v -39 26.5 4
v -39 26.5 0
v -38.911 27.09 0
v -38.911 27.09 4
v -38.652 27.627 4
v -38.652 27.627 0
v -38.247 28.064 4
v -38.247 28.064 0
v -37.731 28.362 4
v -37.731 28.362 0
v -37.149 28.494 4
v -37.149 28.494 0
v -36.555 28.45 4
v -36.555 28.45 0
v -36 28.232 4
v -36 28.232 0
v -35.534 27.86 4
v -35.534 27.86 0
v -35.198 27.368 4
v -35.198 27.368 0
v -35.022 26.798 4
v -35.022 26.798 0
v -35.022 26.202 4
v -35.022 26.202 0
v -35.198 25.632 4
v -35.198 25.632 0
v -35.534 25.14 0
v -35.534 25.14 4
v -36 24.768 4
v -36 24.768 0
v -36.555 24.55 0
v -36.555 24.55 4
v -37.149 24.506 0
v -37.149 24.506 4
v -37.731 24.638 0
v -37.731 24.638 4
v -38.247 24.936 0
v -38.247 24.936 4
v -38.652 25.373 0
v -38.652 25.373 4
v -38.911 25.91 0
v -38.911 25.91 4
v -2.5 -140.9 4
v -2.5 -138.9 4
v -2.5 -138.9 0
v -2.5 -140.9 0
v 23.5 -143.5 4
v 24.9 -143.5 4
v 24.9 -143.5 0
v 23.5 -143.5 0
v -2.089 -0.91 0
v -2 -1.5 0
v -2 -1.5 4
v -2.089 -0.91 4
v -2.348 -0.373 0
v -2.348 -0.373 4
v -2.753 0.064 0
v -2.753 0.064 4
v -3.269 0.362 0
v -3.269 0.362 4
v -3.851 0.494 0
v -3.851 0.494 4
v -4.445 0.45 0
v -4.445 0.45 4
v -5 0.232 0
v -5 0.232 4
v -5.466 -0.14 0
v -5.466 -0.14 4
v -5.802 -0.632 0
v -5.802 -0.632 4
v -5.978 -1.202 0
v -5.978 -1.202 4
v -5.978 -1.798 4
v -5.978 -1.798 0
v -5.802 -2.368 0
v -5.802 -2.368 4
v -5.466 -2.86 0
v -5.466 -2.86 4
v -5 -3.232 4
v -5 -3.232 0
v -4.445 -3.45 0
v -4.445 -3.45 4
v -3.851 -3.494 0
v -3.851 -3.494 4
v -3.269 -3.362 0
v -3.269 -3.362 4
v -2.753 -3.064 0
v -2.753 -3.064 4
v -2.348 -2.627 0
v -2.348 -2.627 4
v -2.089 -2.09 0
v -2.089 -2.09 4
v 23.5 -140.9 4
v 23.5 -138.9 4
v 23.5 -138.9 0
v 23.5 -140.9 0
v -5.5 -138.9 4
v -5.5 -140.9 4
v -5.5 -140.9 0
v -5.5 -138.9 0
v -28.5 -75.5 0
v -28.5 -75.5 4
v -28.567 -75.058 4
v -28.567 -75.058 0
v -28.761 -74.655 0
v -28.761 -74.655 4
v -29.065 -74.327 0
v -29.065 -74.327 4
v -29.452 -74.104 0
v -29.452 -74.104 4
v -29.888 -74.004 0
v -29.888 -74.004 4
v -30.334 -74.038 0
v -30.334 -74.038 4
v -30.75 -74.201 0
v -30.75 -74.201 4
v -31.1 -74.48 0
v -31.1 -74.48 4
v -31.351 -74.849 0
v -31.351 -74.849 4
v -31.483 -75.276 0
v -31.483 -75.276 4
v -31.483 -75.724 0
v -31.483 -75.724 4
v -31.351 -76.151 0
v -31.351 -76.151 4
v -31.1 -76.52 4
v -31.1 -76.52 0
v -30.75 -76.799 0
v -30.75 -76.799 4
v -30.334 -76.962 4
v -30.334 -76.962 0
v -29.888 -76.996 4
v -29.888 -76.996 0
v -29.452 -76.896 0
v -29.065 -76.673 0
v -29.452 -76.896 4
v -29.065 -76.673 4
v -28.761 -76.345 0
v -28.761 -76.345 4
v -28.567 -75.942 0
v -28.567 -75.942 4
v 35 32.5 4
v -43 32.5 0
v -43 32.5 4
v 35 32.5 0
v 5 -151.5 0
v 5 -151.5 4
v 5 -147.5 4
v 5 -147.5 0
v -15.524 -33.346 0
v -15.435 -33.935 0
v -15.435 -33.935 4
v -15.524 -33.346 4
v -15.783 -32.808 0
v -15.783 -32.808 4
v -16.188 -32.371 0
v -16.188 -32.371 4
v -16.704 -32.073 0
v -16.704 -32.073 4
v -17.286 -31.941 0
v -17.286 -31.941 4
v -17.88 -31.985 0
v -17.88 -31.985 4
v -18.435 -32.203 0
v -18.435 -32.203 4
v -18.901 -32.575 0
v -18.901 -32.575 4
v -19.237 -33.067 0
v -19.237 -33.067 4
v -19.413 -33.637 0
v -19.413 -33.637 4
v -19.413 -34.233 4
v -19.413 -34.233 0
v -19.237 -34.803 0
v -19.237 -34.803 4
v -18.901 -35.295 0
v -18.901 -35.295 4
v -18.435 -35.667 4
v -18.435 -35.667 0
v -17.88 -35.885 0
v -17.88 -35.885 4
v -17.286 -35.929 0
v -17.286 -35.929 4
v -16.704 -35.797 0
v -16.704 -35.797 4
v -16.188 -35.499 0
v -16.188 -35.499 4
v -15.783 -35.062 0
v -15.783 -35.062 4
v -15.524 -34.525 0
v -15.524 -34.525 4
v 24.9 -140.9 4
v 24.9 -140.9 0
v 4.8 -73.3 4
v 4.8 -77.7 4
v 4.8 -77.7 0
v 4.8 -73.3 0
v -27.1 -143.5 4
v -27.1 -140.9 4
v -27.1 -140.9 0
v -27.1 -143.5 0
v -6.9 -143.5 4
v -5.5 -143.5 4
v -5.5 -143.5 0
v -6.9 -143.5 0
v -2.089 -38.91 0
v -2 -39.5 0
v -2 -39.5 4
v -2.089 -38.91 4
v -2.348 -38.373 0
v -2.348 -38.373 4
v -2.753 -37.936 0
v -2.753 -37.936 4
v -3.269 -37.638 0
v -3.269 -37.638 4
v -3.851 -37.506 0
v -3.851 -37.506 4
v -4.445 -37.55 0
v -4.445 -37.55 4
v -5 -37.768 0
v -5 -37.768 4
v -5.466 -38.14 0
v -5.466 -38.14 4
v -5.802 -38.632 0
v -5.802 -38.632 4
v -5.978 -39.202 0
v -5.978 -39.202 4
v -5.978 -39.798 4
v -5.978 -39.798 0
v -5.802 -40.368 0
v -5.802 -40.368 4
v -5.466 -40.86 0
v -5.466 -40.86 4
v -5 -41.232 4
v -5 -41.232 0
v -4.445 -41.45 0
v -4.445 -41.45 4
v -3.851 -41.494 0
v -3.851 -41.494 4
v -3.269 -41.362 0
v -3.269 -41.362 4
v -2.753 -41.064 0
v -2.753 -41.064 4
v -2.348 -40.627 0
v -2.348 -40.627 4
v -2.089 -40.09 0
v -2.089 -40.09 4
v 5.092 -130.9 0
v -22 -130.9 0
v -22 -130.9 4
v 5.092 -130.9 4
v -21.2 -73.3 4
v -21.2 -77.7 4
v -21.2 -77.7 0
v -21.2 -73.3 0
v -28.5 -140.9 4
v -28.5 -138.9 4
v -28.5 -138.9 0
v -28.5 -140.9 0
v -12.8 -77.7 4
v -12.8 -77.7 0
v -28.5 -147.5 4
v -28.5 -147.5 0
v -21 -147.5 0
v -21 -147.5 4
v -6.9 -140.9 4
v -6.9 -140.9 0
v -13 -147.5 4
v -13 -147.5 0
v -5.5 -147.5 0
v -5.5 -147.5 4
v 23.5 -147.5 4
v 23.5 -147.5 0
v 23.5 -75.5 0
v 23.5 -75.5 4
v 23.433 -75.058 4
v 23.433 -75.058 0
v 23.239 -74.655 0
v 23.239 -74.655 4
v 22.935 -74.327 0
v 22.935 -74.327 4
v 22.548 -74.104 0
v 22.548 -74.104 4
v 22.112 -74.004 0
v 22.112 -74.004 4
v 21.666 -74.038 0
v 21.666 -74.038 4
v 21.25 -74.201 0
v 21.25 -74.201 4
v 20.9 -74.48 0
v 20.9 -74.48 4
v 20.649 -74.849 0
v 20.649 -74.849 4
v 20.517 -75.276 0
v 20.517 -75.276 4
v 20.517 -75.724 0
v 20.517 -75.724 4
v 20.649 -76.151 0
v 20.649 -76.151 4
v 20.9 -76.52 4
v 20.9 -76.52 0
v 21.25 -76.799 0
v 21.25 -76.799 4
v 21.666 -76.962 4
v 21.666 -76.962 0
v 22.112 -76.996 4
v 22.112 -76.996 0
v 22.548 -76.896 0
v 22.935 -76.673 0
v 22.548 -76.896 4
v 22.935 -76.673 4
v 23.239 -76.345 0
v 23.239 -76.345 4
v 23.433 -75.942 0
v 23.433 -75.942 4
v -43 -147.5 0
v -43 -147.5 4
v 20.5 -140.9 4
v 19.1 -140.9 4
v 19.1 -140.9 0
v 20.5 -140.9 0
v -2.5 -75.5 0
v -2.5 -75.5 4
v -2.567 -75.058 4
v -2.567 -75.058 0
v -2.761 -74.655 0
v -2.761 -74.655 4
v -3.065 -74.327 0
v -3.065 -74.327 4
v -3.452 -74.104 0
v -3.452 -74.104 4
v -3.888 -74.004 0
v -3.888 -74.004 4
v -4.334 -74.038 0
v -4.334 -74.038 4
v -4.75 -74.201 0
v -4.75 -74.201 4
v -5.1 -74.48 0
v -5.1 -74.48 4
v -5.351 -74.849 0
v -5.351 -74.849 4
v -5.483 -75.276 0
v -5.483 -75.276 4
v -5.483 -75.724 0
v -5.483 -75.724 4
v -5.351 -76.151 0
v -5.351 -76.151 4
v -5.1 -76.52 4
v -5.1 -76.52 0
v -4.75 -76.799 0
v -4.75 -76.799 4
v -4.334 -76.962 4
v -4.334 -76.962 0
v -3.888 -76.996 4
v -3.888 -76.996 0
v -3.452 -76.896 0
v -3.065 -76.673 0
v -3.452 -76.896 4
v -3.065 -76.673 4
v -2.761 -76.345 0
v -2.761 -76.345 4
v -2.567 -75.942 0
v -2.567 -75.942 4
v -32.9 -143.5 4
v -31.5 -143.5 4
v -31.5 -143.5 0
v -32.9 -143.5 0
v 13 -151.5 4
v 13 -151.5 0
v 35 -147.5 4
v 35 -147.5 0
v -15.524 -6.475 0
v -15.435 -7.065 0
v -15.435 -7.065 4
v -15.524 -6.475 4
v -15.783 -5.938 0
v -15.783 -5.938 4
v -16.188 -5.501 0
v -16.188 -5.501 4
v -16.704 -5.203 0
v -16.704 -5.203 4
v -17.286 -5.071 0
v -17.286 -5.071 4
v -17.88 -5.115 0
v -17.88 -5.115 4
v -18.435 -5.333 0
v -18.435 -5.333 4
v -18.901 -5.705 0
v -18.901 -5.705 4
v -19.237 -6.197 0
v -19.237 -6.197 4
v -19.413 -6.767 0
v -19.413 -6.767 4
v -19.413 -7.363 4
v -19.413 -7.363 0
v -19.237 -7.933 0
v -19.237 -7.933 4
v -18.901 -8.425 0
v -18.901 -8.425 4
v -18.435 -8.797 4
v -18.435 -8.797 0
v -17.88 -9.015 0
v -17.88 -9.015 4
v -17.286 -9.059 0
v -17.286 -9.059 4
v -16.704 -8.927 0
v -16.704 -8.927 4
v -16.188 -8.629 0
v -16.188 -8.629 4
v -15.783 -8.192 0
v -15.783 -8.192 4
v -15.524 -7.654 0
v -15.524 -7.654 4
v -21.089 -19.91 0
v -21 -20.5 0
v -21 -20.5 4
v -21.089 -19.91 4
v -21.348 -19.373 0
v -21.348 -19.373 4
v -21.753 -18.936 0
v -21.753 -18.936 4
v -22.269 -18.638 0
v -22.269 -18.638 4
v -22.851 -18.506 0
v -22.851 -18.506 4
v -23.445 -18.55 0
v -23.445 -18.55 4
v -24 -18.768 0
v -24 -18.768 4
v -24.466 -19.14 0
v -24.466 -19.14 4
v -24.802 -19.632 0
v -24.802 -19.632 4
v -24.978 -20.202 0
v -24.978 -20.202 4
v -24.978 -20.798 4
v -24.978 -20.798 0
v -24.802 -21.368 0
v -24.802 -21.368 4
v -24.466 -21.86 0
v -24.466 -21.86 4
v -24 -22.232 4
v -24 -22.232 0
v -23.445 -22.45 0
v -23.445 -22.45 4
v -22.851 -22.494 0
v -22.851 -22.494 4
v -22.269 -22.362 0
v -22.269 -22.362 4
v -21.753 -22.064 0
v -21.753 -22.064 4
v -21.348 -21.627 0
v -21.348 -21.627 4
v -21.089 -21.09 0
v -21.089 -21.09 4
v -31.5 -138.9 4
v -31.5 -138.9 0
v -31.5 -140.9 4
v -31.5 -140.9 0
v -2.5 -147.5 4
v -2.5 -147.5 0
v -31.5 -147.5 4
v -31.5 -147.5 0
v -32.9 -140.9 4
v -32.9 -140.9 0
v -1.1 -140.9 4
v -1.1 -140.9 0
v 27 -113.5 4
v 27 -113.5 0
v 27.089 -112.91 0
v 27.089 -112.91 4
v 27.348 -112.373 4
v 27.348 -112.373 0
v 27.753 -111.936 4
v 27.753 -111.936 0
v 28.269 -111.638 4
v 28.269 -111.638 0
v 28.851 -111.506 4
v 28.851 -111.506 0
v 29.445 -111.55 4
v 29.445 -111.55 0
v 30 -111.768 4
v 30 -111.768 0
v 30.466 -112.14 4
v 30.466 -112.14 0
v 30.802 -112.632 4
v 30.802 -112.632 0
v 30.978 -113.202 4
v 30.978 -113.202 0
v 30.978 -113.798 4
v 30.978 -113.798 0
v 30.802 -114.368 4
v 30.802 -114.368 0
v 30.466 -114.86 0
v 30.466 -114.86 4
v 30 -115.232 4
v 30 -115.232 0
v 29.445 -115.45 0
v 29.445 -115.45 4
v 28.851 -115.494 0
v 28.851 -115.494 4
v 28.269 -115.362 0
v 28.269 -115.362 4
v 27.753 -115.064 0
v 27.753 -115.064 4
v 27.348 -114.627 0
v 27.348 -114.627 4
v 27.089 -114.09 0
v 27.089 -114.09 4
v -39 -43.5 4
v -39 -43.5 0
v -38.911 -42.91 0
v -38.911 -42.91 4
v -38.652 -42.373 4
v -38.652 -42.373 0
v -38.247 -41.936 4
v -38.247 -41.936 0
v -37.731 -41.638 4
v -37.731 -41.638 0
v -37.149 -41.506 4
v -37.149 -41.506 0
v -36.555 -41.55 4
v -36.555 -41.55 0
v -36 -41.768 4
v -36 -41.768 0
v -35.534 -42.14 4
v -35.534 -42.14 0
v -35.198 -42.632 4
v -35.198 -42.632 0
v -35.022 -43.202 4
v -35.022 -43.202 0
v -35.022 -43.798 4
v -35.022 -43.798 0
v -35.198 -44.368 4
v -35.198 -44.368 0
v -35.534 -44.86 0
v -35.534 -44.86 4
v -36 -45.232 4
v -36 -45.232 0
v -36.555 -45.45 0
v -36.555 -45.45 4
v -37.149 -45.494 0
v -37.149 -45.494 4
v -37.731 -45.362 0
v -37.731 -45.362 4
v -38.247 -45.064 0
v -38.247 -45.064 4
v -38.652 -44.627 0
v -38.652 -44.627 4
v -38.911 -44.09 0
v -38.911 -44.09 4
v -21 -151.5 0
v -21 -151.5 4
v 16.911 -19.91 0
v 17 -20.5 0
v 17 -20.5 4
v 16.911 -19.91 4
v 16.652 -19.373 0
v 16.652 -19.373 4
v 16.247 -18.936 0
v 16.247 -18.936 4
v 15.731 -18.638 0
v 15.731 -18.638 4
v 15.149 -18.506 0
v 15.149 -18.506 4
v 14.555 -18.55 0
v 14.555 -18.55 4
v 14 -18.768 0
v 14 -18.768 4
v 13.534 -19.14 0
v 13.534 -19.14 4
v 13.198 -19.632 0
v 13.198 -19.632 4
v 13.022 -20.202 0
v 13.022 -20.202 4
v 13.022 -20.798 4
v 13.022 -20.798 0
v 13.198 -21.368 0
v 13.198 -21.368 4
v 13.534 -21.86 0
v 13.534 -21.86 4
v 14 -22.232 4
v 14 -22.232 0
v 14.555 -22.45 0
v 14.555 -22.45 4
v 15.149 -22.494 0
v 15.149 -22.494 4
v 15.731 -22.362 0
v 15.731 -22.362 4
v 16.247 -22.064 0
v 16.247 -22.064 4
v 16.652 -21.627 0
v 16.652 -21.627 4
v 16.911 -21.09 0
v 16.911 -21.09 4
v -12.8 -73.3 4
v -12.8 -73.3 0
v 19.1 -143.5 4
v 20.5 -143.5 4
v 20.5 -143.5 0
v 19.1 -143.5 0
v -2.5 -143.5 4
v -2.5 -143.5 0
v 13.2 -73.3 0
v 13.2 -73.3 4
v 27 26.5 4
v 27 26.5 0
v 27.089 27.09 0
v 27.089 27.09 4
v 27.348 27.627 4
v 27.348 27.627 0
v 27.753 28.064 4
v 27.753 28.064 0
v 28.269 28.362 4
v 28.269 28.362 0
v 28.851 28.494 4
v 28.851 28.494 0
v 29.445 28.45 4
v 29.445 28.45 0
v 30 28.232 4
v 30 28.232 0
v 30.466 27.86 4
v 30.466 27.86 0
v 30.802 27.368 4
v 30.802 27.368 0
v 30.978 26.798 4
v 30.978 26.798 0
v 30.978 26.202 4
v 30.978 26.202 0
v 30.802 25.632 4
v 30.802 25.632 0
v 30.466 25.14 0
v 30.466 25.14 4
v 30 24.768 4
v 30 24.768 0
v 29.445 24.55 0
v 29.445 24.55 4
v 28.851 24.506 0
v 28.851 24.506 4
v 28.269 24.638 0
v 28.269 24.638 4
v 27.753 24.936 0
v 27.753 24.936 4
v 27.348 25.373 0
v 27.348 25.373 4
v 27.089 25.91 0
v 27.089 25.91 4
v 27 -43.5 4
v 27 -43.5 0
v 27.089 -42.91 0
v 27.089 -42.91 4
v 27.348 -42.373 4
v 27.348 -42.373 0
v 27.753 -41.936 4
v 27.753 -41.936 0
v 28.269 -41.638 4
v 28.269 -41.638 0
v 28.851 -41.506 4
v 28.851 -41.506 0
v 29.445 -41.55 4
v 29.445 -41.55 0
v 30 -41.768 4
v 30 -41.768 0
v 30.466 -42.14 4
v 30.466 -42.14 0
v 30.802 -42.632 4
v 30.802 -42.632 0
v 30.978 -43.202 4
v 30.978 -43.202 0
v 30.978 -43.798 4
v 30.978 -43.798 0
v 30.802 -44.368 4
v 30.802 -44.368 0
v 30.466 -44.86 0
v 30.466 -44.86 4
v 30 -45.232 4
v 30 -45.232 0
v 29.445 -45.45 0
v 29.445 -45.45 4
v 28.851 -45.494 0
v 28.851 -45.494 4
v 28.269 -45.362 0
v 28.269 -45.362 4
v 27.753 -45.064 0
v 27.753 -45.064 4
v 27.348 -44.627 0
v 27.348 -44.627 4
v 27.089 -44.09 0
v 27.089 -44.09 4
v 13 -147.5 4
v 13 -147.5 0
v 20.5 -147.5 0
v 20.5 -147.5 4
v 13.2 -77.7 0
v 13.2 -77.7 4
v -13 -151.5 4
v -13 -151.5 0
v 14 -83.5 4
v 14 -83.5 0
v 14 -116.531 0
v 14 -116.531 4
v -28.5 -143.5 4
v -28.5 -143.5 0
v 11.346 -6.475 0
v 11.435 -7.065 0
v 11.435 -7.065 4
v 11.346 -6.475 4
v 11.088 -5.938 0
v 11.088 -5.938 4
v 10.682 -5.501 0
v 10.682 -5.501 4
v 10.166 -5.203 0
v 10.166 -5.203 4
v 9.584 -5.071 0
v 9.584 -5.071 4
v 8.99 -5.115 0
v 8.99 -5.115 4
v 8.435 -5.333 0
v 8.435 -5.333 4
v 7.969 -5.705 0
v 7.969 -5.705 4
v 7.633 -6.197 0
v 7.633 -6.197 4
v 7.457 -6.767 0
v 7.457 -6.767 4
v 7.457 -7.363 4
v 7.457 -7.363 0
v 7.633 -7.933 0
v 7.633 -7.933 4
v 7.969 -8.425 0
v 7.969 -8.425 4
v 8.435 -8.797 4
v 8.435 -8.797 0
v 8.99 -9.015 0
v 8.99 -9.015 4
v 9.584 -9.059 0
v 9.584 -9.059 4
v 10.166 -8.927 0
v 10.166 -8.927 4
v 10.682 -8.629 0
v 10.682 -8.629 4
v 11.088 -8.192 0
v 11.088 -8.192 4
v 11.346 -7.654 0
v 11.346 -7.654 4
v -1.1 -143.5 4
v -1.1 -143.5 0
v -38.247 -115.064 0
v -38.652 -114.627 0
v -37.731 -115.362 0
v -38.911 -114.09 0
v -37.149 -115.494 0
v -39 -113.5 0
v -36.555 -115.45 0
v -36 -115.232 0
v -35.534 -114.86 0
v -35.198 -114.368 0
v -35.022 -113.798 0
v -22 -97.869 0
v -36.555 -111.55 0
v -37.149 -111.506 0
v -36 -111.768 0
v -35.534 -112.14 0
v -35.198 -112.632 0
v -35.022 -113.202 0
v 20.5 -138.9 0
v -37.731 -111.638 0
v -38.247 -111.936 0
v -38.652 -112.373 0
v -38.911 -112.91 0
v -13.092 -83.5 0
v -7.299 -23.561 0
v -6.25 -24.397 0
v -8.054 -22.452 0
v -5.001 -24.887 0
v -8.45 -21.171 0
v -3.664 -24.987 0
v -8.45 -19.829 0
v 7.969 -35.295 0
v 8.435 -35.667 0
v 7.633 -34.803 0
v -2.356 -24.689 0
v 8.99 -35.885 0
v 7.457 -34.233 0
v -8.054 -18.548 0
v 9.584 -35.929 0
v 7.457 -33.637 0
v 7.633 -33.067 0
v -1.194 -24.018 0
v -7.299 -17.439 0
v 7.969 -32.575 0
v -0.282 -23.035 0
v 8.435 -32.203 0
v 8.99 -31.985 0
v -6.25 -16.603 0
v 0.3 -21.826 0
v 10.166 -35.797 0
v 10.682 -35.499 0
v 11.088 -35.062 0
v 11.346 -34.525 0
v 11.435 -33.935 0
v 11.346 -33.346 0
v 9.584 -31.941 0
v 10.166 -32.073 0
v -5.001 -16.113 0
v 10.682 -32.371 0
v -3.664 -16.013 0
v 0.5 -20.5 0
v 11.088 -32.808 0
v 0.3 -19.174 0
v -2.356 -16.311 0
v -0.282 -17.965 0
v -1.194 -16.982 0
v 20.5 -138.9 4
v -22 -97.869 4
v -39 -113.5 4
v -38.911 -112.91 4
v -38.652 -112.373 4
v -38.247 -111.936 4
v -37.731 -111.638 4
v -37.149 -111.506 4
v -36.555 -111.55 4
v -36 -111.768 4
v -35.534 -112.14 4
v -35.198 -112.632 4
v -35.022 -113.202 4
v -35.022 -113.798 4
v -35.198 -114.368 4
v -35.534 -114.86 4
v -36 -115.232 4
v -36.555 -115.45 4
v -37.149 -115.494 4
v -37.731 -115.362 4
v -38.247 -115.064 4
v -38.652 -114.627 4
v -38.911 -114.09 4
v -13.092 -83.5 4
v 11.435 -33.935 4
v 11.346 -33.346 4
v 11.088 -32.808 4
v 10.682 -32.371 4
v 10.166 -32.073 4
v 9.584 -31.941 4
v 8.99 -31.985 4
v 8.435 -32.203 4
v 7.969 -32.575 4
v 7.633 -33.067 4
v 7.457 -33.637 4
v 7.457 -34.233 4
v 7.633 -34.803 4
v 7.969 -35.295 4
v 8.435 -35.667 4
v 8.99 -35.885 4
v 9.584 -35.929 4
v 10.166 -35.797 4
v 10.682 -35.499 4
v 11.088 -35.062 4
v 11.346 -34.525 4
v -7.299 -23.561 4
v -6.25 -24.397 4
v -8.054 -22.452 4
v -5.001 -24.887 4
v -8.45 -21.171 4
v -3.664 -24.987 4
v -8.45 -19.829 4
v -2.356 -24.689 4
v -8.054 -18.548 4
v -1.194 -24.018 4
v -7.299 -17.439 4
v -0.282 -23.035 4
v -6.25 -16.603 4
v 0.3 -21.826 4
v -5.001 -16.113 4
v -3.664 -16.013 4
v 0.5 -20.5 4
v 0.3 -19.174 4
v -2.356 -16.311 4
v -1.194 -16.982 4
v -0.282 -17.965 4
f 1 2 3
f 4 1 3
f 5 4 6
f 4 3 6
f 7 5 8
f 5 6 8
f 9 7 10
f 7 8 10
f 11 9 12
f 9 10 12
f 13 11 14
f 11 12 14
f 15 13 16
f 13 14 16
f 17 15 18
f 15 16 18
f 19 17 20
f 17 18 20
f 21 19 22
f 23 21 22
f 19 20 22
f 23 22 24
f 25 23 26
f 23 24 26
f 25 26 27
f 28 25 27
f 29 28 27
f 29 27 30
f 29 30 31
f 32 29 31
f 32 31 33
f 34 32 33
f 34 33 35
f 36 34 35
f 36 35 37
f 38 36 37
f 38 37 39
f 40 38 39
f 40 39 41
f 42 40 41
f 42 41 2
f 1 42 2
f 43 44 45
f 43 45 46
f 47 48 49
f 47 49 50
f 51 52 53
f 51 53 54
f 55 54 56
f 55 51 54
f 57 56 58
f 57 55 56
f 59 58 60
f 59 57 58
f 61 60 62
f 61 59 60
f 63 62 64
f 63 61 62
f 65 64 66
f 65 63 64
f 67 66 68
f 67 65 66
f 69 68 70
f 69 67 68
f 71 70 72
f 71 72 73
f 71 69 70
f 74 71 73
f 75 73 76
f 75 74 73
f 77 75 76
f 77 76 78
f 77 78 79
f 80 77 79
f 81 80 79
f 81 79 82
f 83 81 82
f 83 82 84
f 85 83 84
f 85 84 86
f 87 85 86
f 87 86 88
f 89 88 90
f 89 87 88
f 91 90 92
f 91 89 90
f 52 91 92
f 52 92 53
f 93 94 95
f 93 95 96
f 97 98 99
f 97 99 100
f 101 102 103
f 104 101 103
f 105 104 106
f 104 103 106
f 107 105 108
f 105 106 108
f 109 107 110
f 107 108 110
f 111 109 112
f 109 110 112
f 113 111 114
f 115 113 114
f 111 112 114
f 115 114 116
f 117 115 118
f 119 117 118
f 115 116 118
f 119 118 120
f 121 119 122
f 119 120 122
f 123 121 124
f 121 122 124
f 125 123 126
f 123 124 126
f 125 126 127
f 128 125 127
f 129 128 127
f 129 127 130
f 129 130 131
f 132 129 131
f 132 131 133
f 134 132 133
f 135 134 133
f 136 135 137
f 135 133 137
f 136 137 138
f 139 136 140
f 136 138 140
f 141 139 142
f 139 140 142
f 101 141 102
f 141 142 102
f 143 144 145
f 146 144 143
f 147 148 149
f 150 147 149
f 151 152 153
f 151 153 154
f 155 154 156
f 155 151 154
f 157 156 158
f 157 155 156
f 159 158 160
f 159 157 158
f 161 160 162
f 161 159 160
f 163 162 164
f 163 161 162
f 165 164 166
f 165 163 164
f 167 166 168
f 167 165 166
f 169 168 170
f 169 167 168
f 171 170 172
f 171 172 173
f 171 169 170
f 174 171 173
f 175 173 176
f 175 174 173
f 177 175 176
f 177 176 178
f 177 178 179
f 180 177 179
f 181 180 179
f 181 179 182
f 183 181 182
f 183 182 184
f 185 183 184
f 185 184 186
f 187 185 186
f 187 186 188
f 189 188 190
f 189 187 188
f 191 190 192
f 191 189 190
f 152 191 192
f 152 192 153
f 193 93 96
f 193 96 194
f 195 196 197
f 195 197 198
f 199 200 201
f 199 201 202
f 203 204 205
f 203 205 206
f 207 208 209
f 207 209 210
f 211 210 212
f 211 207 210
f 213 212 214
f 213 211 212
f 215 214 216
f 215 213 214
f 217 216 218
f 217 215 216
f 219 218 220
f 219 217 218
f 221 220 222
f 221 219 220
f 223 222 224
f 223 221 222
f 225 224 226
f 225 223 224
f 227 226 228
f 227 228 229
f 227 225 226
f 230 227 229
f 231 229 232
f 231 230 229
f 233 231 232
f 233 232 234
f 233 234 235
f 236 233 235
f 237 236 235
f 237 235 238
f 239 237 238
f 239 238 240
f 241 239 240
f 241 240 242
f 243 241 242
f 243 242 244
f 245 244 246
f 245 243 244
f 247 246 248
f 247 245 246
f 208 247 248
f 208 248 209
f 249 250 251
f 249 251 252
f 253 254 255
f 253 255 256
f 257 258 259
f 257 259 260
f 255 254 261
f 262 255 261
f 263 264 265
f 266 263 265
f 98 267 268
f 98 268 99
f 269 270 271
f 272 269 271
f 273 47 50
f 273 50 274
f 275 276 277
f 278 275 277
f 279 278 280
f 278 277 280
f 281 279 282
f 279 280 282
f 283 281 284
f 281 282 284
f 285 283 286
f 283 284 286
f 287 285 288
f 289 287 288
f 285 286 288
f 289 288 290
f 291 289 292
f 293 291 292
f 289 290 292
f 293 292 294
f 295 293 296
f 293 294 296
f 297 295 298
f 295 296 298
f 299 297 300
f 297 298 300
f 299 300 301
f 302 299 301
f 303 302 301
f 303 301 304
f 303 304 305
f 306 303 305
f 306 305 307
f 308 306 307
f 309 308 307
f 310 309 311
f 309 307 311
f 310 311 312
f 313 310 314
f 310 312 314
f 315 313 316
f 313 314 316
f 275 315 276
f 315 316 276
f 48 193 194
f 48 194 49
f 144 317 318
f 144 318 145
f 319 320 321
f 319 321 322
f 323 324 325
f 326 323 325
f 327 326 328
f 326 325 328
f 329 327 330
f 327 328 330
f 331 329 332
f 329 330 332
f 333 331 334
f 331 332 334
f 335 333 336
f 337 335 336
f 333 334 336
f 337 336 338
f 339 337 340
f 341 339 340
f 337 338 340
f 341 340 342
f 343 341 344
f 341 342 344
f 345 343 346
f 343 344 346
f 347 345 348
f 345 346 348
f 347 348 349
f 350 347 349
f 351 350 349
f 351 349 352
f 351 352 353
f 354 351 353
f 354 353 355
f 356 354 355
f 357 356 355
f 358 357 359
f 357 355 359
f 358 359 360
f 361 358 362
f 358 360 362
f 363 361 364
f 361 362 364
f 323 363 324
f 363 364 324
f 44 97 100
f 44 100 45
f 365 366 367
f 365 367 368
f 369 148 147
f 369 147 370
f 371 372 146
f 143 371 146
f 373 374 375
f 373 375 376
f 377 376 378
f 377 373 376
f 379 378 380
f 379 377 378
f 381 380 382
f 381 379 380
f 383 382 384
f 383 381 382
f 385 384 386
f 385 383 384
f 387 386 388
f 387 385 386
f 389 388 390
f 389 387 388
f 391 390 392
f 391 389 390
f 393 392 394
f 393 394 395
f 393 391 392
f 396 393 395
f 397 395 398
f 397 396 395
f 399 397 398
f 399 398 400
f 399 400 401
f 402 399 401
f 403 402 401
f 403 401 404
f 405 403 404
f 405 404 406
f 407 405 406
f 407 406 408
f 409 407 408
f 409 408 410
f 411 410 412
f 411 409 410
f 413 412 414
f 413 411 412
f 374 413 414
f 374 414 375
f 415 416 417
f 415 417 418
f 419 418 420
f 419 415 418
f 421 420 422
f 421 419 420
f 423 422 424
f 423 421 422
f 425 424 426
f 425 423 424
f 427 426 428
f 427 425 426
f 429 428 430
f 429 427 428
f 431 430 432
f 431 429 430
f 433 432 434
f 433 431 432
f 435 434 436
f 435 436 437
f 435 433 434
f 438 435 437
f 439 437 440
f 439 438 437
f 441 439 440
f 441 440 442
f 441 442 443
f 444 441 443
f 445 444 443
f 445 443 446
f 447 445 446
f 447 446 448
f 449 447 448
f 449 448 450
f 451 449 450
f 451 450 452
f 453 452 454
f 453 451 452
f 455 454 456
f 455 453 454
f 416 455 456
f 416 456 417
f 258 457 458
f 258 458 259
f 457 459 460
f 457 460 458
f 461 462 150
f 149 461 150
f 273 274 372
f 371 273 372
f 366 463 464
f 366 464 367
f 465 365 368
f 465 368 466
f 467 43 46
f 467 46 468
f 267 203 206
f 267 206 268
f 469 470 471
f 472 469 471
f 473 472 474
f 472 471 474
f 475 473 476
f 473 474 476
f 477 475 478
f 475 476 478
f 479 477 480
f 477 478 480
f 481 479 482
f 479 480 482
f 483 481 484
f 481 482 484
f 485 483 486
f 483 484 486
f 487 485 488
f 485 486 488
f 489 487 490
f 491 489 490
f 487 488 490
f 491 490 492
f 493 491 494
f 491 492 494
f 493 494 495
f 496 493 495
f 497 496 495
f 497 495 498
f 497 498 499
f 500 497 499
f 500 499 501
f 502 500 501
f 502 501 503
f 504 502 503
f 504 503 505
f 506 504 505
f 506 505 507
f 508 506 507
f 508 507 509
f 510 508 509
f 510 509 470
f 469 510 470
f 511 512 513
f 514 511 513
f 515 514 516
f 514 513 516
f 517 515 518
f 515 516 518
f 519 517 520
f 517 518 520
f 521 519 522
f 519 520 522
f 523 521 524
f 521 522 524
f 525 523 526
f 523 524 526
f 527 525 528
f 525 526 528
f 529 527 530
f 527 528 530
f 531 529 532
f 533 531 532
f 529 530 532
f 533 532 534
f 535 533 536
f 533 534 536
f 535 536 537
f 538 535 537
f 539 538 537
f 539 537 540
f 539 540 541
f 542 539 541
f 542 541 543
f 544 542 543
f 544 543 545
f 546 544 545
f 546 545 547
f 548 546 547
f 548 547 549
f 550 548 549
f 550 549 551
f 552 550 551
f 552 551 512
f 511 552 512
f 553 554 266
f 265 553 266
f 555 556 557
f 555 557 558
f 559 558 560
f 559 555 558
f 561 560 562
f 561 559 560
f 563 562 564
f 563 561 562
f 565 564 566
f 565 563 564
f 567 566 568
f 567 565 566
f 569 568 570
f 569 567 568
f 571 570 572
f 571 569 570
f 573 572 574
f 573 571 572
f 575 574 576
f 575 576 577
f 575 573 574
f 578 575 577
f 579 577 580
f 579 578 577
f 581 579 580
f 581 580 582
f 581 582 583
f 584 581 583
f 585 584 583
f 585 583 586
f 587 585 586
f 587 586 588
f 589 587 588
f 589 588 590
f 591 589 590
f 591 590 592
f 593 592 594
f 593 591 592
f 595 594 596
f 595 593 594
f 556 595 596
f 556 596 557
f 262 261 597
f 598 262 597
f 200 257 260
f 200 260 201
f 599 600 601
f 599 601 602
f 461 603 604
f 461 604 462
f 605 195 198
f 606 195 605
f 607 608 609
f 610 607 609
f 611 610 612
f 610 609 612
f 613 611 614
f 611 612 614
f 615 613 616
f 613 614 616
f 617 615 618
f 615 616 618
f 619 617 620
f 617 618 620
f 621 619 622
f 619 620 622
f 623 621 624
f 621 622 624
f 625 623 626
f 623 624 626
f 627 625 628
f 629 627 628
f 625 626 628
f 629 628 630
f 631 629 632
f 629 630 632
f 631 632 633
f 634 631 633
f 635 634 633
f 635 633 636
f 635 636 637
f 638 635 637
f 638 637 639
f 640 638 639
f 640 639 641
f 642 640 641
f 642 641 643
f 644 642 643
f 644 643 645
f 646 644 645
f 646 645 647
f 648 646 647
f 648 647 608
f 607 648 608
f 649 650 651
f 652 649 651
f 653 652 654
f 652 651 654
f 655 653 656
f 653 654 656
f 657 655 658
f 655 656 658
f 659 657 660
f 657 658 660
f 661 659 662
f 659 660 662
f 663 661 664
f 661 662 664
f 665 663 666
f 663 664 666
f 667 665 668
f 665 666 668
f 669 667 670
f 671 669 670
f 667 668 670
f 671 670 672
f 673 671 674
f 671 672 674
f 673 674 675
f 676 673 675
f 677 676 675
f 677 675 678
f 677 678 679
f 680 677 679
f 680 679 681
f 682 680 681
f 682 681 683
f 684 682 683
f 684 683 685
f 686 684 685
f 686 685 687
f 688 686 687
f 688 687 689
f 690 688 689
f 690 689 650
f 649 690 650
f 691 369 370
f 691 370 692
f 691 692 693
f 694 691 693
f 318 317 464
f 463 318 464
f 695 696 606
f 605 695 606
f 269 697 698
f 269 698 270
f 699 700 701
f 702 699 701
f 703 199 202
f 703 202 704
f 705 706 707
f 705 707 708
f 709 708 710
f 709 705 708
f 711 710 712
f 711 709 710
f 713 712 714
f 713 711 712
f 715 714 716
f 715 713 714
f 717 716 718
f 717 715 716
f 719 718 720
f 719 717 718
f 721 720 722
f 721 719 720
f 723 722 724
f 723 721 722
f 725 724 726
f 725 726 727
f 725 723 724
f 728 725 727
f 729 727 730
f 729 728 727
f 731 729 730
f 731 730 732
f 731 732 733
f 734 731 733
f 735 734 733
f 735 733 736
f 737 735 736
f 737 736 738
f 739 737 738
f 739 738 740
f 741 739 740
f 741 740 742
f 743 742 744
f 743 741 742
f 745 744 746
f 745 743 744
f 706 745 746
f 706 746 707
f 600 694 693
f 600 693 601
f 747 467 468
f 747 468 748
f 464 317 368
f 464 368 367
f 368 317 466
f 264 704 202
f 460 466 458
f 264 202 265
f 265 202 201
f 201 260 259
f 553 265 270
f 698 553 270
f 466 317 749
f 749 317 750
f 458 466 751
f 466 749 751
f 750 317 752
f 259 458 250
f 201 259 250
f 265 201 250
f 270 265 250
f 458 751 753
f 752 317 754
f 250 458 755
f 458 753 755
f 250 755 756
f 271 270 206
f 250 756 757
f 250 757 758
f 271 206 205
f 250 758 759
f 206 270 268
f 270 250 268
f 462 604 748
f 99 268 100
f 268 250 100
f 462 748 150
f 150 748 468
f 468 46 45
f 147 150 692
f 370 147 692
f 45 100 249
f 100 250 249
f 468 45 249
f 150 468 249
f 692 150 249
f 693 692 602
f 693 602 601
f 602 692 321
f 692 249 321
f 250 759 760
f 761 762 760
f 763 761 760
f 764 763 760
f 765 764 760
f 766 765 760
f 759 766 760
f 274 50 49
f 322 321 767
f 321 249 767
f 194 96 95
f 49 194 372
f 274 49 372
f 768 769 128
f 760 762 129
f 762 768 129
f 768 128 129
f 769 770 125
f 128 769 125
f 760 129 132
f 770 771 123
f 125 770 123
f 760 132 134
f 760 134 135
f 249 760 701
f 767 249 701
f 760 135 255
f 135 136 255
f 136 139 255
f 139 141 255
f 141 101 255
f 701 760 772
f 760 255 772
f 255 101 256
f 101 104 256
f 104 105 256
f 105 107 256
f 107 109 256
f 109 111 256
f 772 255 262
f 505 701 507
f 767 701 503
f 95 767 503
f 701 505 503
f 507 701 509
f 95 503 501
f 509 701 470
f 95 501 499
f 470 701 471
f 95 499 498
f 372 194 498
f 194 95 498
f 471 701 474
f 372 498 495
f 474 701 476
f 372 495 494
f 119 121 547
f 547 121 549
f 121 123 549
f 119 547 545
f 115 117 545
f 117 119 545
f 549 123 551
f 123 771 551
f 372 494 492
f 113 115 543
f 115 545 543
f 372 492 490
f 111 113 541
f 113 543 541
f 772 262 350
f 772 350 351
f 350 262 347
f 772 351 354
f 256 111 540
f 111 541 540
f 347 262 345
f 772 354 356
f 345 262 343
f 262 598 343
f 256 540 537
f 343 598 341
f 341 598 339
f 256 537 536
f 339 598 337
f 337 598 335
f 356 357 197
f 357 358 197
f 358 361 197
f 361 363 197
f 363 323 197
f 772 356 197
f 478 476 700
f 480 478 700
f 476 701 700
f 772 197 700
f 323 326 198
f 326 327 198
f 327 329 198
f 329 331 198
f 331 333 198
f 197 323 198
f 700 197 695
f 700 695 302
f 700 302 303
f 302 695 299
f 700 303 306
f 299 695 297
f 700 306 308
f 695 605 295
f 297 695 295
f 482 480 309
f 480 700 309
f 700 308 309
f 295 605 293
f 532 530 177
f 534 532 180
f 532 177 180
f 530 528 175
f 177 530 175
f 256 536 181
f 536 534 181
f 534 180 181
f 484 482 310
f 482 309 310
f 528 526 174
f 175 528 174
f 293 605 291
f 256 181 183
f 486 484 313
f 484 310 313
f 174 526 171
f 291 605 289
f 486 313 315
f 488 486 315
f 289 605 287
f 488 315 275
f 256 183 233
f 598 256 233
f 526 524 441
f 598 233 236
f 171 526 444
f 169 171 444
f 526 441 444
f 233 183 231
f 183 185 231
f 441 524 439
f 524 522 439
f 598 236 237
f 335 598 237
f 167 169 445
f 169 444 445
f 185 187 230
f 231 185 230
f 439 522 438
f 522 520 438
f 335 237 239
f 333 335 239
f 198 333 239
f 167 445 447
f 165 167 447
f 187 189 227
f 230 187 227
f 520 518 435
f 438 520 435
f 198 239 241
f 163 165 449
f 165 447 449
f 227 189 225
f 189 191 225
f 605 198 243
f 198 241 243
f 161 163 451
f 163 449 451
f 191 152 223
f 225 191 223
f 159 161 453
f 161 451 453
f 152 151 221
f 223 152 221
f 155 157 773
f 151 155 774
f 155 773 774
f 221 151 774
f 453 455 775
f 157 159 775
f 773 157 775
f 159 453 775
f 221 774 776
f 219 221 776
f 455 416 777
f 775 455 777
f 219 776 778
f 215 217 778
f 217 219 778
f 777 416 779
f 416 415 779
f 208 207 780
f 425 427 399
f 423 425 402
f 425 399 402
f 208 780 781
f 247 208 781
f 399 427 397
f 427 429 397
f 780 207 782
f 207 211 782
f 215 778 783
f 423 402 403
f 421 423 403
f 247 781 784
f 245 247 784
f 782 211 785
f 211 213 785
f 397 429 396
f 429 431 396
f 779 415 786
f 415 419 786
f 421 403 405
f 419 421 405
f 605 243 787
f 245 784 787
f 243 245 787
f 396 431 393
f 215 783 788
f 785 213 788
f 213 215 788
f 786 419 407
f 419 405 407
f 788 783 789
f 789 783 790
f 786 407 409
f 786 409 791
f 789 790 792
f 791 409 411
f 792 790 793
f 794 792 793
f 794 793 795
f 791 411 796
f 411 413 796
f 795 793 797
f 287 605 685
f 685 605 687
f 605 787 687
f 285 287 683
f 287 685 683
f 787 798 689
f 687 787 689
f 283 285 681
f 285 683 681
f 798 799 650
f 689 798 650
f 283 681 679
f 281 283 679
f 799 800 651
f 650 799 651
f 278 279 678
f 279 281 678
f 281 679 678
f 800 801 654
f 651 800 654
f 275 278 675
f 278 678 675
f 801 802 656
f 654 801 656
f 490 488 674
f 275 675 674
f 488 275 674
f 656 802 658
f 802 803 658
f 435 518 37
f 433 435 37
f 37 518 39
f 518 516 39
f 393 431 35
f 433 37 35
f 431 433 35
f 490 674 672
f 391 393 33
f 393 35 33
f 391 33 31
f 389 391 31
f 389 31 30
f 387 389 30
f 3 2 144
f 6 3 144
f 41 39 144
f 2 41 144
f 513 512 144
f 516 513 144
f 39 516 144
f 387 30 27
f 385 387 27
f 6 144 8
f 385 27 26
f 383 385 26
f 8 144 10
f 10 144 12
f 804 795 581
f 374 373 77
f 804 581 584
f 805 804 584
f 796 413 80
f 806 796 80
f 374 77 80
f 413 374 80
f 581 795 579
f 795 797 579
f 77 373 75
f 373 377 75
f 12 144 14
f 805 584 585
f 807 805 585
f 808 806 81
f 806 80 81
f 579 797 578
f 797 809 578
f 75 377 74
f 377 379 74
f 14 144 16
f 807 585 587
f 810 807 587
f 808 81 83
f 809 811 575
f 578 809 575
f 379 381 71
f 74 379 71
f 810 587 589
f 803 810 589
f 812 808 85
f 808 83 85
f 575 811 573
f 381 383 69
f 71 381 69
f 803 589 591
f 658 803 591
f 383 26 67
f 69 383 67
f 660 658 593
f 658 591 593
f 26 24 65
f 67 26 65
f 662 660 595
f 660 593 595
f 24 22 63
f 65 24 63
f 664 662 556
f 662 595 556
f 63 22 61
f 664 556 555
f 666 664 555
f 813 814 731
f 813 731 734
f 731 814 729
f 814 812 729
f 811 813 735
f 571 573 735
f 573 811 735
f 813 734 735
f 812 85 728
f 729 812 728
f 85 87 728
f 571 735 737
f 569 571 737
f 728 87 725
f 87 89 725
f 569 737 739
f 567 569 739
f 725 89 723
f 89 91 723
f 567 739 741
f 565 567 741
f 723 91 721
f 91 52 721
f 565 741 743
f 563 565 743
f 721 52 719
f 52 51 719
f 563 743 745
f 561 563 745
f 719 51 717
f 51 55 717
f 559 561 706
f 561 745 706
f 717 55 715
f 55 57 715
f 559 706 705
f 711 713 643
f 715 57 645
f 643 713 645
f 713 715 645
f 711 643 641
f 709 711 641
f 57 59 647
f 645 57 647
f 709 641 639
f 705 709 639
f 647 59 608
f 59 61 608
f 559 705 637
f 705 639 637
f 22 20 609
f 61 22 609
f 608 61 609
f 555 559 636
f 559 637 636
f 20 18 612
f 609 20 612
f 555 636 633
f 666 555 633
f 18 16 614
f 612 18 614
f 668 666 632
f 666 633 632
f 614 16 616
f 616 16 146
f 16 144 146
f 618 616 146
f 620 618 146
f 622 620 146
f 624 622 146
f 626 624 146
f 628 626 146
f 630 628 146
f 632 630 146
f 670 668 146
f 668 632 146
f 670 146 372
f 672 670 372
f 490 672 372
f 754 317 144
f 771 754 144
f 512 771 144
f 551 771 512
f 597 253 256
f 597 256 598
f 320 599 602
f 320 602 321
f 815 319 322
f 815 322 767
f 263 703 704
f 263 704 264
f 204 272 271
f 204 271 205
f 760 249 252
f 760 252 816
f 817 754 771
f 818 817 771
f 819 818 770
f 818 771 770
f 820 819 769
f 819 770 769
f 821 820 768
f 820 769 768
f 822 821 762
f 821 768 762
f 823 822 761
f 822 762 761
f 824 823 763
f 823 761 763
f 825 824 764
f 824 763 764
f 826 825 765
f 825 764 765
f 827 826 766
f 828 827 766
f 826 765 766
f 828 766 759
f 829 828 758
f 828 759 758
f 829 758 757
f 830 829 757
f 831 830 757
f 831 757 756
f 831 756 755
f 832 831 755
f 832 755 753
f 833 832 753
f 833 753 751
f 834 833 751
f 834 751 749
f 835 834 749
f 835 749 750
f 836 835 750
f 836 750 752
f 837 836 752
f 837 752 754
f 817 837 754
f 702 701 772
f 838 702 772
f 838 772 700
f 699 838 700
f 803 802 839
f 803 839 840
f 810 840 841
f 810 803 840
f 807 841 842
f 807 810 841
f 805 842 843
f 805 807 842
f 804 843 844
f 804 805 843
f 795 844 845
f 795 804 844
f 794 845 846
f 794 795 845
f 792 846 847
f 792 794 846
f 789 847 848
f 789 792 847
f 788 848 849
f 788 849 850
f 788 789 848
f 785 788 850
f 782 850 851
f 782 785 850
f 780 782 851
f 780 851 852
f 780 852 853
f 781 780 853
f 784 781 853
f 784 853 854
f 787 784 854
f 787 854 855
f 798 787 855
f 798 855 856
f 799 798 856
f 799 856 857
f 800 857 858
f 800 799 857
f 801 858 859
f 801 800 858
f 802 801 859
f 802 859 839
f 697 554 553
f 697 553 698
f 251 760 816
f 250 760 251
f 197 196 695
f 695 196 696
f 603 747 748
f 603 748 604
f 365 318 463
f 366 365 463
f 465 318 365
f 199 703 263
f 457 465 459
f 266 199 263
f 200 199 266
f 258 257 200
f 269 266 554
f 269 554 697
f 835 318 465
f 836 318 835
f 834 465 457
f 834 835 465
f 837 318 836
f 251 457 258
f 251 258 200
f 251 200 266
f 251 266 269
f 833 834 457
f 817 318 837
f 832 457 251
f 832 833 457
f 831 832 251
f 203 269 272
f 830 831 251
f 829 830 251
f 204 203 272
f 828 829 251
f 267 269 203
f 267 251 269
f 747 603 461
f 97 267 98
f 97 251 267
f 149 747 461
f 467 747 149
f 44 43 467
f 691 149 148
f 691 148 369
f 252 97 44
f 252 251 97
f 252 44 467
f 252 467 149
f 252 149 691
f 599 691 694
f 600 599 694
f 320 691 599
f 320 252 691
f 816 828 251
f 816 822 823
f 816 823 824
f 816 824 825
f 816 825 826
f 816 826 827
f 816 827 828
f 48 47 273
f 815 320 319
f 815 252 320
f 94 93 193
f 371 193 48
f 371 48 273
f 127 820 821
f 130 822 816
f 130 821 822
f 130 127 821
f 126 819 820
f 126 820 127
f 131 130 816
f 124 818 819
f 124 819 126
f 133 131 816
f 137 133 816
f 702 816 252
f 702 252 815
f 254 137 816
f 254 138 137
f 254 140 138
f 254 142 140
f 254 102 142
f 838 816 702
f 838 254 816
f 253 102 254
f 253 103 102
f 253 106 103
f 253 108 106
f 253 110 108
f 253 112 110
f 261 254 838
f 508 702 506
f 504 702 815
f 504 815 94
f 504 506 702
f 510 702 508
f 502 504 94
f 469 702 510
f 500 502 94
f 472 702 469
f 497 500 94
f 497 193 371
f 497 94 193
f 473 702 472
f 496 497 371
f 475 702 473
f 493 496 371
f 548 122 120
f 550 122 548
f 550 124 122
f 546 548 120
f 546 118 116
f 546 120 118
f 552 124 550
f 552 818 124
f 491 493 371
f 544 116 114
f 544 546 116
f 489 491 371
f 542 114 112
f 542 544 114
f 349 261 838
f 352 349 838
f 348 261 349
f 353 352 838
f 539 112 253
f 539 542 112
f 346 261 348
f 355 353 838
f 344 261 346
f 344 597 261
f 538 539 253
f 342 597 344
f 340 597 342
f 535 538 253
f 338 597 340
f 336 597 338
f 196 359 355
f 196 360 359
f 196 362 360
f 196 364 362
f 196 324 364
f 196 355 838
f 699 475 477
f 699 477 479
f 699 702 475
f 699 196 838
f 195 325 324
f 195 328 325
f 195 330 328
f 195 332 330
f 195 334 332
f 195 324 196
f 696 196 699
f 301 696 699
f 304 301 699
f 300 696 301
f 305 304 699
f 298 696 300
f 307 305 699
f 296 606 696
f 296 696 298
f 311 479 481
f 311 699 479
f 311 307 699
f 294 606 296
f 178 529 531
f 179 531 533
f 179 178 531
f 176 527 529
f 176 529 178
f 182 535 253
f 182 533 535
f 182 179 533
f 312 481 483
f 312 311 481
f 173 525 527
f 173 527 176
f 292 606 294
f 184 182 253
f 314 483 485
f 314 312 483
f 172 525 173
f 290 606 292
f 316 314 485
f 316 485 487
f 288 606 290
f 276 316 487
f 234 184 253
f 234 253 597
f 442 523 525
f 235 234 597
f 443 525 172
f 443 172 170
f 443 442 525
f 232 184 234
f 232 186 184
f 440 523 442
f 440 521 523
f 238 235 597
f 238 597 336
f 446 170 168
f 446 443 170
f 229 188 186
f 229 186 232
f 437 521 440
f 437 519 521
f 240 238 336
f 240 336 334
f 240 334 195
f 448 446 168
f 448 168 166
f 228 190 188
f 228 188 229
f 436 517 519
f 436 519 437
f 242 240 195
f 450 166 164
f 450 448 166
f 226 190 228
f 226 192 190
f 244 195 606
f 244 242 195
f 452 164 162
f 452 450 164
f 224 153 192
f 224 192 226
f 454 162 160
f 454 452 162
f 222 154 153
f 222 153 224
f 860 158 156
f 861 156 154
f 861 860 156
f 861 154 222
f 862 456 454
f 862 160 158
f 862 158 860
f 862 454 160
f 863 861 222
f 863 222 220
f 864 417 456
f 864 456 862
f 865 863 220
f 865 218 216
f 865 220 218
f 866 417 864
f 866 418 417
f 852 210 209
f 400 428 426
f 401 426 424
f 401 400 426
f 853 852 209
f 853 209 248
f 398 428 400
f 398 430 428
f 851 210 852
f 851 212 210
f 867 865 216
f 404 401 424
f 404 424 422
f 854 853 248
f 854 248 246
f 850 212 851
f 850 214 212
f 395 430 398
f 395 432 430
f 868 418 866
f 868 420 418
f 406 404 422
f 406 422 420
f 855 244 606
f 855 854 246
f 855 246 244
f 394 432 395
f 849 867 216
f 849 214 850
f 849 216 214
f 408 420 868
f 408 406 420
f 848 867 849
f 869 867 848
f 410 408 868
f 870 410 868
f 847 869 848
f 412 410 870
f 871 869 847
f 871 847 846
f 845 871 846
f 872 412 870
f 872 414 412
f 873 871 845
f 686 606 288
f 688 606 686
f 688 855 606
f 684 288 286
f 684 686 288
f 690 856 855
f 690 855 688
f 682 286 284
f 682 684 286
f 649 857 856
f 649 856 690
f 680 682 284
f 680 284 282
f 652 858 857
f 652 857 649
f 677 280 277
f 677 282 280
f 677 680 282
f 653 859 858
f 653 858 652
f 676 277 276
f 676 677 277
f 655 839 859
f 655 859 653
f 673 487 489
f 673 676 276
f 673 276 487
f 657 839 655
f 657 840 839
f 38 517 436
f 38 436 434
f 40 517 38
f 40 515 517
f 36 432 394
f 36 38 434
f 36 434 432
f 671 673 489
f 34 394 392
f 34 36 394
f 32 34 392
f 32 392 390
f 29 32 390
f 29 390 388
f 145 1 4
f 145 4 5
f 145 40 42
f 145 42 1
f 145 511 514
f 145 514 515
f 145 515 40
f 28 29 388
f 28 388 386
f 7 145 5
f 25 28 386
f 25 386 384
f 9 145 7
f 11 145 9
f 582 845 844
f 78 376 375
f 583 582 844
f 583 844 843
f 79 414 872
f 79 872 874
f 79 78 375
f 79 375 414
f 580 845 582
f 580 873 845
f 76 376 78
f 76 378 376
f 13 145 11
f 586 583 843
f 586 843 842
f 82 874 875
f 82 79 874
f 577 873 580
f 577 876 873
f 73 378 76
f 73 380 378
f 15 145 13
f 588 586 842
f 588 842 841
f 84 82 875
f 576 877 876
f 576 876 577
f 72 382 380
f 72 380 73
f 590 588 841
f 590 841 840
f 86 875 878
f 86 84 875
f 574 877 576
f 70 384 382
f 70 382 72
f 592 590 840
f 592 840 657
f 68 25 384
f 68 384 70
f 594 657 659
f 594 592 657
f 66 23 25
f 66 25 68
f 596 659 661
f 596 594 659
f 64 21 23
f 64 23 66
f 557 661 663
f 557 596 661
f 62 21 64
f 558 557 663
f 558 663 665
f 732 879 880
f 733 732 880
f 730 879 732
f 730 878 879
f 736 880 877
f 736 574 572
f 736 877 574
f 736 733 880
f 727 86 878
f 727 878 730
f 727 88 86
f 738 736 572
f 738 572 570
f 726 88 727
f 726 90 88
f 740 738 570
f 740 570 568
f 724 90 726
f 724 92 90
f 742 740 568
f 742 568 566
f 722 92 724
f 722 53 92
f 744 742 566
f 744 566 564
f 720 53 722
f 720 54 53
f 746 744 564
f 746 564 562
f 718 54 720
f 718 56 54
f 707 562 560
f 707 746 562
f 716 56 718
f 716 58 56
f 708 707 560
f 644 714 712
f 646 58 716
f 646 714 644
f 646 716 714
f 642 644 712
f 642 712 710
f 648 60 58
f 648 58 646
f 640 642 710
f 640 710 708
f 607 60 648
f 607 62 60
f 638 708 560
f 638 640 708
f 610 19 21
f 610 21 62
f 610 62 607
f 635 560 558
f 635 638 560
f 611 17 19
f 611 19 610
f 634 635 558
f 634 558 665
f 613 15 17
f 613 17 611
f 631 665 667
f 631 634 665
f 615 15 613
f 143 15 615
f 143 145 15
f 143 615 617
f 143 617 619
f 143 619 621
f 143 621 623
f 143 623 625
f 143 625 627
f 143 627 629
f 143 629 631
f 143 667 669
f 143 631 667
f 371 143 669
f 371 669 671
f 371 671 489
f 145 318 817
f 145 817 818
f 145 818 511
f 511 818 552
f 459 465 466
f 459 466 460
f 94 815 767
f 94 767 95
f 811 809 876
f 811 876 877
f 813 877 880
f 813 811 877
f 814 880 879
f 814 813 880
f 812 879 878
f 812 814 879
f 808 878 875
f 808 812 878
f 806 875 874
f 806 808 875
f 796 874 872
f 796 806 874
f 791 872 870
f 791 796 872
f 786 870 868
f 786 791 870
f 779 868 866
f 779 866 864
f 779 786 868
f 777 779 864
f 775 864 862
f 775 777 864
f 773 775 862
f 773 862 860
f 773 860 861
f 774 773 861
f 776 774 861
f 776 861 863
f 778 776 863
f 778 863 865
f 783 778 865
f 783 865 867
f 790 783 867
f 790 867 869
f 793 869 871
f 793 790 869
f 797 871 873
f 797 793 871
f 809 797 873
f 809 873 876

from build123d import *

# Parameters (mm, degrees)
SKETCH_1_W          = 78
SKETCH_1_H          = 180
SKETCH_1_R          = 4.5
SKETCH_1_R_2        = 2
EXTRUDE_1_DEPTH     = 4
SKETCH_2_R          = 1.5
SKETCH_2_W          = 8.4
SKETCH_2_H          = 4.4
CUT_EXTRUDE_1_DEPTH = 4
SKETCH_6_W          = 8
SKETCH_6_H          = 8
EXTRUDE_2_DEPTH     = 4
SKETCH_7_R          = 2
CUT_EXTRUDE_2_DEPTH = 10


with BuildPart() as part:
    # 草图1 → 凸台-拉伸1 (new body)
    with BuildSketch(Plane.XY):
        with Locations((-4, -57.5)):
            Rectangle(SKETCH_1_W, SKETCH_1_H)
        with Locations((-4, -20.5)):
            Circle(SKETCH_1_R, mode=Mode.SUBTRACT)
        with Locations((15, -20.5)):
            Circle(SKETCH_1_R_2, mode=Mode.SUBTRACT)
        with Locations((9.435028843, -33.935028843)):
            Circle(SKETCH_1_R_2, mode=Mode.SUBTRACT)
        with Locations((-4, -39.5)):
            Circle(SKETCH_1_R_2, mode=Mode.SUBTRACT)
        with Locations((-17.435028843, -33.935028843)):
            Circle(SKETCH_1_R_2, mode=Mode.SUBTRACT)
        with Locations((-23, -20.5)):
            Circle(SKETCH_1_R_2, mode=Mode.SUBTRACT)
        with Locations((-17.435028843, -7.064971157)):
            Circle(SKETCH_1_R_2, mode=Mode.SUBTRACT)
        with Locations((-4, -1.5)):
            Circle(SKETCH_1_R_2, mode=Mode.SUBTRACT)
        with Locations((9.435028843, -7.064971157)):
            Circle(SKETCH_1_R_2, mode=Mode.SUBTRACT)
    extrude(amount=EXTRUDE_1_DEPTH)

    # 草图2 → 切除-拉伸1 (cut)
    with BuildSketch(Plane.XY.offset(4)):
        with Locations((-4, -75.5)):
            Circle(SKETCH_2_R)
        with Locations((22, -75.5)):
            Circle(SKETCH_2_R)
        with Locations((-30, -75.5)):
            Circle(SKETCH_2_R)
        with Locations((-17, -75.5)):
            Rectangle(SKETCH_2_W, SKETCH_2_H)
        with Locations((9, -75.5)):
            Rectangle(SKETCH_2_W, SKETCH_2_H)
        Polygon((-31.5, -147.5), (-31.5, -143.5), (-32.9, -143.5), (-32.9, -140.9), (-31.5, -140.9), (-31.5, -138.9), (-28.5, -138.9), (-28.5, -140.9), (-27.1, -140.9), (-27.1, -143.5), (-28.5, -143.5), (-28.5, -147.5), align=None)
        Polygon((23.5, -147.5), (20.5, -147.5), (20.5, -143.5), (19.1, -143.5), (19.1, -140.9), (20.5, -140.9), (20.5, -138.9), (23.5, -138.9), (23.5, -140.9), (24.9, -140.9), (24.9, -143.5), (23.5, -143.5), align=None)
        Polygon((-5.5, -147.5), (-5.5, -143.5), (-6.9, -143.5), (-6.9, -140.9), (-5.5, -140.9), (-5.5, -138.9), (-2.5, -138.9), (-2.5, -140.9), (-1.1, -140.9), (-1.1, -143.5), (-2.5, -143.5), (-2.5, -147.5), align=None)
    extrude(amount=-CUT_EXTRUDE_1_DEPTH, mode=Mode.SUBTRACT)

    # 草图6 → 凸台-拉伸2 (add)
    with BuildSketch(Plane.XY.offset(4)):
        with Locations((-17, -147.5)):
            Rectangle(SKETCH_6_W, SKETCH_6_H)
        with Locations((9, -147.5)):
            Rectangle(SKETCH_6_W, SKETCH_6_H)
    extrude(amount=-EXTRUDE_2_DEPTH)

    # 草图7 → 切除-拉伸2 (cut)
    with BuildSketch(Plane(origin=(0, 0, 0), x_dir=(-1, 0, 0), z_dir=(0, 0, -1))):
        with Locations((-29, 26.5)):
            Circle(SKETCH_7_R)
        with Locations((-29, -43.5)):
            Circle(SKETCH_7_R)
        with Locations((-29, -113.5)):
            Circle(SKETCH_7_R)
        with Locations((37, -43.5)):
            Circle(SKETCH_7_R)
        with Locations((37, -113.5)):
            Circle(SKETCH_7_R)
        with Locations((37, 26.5)):
            Circle(SKETCH_7_R)
        Polygon((-14, -83.5), (-14, -116.531181995), (13.091821195, -83.5), align=None)
        Polygon((-5.091821195, -130.9), (22, -97.868818005), (22, -130.9), align=None)
    extrude(amount=-CUT_EXTRUDE_2_DEPTH, mode=Mode.SUBTRACT)


solid = part.part
